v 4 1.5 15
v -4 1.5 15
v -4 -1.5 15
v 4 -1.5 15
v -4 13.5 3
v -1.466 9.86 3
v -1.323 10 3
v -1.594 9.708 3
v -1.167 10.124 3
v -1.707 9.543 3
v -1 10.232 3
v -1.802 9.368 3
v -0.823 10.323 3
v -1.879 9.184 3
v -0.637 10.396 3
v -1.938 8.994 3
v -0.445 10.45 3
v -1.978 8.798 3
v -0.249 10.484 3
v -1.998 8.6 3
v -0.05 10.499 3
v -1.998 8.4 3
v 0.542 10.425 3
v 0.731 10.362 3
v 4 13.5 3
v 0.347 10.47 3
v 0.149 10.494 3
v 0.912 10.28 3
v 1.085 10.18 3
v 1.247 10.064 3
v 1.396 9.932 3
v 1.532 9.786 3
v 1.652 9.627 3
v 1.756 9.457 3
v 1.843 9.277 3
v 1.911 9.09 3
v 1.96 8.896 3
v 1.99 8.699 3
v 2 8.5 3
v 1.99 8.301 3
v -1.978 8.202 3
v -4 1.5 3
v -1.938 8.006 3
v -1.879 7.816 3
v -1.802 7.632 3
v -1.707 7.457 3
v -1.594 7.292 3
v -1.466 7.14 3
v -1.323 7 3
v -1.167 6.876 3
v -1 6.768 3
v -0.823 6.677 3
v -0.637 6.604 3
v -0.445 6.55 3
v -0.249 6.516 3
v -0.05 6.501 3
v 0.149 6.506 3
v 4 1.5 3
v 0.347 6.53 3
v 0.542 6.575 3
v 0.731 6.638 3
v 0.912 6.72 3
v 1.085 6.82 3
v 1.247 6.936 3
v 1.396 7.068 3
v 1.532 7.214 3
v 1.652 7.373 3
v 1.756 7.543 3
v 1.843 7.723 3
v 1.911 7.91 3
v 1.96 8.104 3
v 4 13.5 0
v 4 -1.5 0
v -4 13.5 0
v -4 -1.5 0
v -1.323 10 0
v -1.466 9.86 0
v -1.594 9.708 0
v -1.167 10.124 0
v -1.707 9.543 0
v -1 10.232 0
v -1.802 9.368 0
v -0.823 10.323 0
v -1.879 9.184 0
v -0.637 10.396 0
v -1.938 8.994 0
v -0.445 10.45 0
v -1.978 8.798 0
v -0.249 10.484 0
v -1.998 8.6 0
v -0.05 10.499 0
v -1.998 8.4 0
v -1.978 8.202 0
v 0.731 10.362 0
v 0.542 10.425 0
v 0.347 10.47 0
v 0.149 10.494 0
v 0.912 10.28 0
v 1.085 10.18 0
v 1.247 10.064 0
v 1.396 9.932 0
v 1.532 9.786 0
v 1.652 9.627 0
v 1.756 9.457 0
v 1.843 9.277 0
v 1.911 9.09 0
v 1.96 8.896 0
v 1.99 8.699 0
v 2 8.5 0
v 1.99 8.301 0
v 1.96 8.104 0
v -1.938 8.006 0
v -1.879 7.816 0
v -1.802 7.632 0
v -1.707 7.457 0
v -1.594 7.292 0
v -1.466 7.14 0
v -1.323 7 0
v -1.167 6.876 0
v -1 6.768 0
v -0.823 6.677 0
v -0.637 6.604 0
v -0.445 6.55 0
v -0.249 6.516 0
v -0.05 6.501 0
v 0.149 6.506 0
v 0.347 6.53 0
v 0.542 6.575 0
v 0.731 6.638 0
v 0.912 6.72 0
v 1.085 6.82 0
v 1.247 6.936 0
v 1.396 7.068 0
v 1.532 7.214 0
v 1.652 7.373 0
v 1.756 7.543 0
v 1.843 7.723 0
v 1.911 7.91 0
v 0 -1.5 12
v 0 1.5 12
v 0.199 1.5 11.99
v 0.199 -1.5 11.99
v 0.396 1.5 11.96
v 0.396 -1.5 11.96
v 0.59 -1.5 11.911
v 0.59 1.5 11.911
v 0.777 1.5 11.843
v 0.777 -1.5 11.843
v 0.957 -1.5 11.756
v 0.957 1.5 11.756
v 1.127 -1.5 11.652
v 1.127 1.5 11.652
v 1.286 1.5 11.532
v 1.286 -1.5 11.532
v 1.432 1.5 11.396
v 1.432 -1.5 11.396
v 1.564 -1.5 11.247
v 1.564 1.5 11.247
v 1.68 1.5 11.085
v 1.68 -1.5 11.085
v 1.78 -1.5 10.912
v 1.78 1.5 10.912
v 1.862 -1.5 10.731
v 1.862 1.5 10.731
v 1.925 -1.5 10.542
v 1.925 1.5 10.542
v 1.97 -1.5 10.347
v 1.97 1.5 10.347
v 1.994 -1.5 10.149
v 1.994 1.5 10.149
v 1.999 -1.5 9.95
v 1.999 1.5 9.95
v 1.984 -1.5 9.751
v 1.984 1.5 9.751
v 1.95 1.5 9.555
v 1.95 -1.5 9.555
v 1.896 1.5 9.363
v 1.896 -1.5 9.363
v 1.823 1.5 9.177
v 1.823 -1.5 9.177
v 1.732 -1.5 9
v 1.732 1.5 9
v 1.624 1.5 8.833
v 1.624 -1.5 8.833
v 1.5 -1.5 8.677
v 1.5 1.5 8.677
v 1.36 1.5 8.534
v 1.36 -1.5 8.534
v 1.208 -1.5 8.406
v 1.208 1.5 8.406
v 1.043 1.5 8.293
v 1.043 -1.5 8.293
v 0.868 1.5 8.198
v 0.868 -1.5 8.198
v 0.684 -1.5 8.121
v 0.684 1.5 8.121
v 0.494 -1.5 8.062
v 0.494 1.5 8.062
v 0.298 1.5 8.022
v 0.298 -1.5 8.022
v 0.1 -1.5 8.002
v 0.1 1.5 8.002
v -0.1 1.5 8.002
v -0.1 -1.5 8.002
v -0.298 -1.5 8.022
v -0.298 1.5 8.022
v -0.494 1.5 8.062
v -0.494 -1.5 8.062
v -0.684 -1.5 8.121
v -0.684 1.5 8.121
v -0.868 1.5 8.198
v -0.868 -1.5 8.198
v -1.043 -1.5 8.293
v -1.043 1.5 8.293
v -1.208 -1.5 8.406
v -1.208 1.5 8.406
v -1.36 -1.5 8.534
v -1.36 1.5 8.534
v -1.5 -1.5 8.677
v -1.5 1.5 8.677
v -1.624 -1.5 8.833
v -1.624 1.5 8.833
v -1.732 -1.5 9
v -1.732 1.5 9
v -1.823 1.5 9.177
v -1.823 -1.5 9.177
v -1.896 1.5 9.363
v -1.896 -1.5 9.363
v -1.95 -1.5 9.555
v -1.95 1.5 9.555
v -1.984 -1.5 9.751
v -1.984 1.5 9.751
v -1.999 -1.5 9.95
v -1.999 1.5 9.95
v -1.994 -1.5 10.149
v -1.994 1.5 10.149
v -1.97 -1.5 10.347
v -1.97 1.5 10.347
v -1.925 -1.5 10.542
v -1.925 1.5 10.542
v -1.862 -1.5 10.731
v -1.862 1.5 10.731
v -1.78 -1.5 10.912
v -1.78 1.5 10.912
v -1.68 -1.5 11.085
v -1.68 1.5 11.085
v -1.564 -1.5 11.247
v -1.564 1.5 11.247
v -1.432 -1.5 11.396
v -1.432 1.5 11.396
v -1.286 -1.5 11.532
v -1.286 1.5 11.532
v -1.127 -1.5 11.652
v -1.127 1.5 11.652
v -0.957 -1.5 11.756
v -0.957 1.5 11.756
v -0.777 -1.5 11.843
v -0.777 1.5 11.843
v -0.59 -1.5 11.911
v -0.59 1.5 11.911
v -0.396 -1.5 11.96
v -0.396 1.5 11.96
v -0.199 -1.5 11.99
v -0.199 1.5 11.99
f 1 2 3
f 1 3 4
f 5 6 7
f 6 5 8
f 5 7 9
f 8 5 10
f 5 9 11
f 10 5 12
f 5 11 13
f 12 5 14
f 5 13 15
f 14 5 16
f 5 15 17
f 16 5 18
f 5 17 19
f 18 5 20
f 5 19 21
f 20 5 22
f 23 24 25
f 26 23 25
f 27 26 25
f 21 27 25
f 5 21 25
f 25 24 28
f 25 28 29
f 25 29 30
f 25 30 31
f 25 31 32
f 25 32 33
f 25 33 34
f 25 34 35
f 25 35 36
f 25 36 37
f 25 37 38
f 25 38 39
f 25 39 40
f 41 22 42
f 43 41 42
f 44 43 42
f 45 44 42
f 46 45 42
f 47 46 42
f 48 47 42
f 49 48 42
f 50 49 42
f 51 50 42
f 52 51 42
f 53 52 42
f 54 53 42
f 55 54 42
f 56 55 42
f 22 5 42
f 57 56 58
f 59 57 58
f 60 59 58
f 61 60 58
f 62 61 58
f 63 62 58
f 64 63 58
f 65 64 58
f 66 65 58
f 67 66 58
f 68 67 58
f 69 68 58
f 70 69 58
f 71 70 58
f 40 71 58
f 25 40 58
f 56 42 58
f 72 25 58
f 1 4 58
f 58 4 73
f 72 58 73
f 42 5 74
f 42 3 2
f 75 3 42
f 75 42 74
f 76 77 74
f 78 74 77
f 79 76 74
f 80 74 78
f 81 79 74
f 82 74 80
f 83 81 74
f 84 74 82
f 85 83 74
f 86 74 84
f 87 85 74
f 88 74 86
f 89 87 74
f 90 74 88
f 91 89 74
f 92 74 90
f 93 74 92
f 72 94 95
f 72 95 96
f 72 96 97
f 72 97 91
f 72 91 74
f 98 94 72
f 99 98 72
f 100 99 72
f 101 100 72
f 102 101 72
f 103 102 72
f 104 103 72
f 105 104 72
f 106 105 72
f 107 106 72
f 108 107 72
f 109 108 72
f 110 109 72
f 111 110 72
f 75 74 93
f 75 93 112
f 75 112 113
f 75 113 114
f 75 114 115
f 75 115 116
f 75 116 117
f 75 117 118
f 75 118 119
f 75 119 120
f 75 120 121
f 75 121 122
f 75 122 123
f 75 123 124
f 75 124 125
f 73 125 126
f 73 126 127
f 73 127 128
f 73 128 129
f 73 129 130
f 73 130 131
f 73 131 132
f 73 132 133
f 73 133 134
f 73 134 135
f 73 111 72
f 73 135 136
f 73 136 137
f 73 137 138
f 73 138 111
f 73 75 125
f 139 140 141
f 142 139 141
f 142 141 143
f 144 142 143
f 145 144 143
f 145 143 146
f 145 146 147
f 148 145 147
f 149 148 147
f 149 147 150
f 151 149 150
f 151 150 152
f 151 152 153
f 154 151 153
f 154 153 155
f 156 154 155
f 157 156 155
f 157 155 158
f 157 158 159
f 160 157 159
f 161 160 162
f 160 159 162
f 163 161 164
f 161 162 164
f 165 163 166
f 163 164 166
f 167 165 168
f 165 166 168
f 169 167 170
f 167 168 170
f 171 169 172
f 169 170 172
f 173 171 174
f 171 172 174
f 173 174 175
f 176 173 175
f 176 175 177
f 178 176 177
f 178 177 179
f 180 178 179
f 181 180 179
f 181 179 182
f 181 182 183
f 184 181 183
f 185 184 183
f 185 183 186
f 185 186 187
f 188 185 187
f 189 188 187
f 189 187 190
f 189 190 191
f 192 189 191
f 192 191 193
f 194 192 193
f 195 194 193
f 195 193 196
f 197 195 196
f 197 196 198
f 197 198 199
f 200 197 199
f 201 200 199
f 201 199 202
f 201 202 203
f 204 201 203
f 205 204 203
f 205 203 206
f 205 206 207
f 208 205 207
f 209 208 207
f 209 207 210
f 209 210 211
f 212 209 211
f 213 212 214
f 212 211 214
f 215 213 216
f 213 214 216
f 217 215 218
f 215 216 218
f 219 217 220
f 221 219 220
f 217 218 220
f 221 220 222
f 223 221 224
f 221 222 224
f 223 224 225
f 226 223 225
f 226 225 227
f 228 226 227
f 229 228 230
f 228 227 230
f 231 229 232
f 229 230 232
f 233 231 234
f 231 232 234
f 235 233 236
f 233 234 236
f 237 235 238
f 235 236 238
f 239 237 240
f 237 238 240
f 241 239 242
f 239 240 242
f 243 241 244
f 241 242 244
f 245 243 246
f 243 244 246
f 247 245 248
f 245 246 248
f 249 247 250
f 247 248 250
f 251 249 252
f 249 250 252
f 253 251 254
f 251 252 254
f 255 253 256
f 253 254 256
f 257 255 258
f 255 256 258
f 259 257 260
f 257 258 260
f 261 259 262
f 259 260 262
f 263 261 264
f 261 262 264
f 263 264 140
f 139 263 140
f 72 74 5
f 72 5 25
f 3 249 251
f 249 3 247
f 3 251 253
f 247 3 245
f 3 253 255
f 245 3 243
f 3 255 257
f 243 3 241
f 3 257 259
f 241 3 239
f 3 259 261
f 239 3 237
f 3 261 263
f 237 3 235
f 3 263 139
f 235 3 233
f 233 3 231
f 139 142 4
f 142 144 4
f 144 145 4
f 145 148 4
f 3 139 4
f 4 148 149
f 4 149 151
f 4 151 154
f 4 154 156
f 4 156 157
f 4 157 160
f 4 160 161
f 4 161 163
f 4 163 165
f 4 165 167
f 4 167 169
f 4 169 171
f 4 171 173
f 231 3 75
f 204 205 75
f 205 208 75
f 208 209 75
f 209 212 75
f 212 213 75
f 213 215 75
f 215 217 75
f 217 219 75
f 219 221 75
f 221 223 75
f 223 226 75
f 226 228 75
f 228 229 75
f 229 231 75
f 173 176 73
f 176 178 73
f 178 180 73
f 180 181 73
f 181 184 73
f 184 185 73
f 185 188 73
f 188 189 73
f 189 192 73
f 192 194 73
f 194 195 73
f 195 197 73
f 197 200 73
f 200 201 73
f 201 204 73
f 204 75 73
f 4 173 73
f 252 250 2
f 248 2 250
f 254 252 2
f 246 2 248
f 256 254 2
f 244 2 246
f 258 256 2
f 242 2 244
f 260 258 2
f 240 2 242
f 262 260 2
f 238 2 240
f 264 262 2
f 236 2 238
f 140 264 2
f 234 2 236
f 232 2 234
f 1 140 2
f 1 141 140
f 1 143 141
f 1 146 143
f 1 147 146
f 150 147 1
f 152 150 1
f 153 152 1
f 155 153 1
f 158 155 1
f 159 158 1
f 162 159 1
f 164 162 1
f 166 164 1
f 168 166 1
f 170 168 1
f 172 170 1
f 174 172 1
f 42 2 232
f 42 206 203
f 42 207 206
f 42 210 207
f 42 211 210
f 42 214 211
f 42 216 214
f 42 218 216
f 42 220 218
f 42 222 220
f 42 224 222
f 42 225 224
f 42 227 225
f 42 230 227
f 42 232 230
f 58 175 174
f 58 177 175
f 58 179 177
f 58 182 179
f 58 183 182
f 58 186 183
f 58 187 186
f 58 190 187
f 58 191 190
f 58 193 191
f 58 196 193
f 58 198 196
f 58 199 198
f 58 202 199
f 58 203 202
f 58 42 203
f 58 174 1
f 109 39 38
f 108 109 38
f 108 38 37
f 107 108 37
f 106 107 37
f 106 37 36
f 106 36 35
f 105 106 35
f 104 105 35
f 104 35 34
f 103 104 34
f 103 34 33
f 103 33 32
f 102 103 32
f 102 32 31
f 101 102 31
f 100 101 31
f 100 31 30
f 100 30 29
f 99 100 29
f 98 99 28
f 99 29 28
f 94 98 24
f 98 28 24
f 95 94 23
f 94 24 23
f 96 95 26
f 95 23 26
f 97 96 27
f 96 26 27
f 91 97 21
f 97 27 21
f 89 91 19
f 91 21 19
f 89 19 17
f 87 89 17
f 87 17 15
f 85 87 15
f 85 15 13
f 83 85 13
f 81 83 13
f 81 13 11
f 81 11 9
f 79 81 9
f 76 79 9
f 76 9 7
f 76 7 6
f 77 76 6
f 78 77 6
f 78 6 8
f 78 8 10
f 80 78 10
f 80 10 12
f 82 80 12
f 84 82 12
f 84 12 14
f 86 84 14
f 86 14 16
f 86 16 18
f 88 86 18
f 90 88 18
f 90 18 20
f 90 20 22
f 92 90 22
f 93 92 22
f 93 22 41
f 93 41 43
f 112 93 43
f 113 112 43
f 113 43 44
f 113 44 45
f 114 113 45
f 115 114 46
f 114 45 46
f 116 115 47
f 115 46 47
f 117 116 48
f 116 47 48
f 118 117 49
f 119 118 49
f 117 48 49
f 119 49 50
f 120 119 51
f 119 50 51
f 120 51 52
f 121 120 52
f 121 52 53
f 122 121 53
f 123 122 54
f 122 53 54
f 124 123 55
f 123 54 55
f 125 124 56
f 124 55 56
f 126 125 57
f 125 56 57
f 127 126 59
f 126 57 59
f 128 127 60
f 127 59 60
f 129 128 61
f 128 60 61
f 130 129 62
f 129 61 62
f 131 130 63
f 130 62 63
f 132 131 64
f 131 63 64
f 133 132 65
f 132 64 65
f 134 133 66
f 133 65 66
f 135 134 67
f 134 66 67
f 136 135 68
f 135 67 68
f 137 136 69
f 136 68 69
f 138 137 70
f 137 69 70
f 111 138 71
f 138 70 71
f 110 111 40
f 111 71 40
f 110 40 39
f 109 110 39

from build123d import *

# Parameters (mm, degrees)
ESQUISSE1_W             = 8
ESQUISSE1_H             = 3
BOSS_EXTRU_1_DEPTH      = 15
ESQUISSE2_W             = 8
ESQUISSE2_H             = 3
BOSS_EXTRU_2_DEPTH      = 12
ESQUISSE3_R             = 2
ENL_V_MAT_EXTRU_1_DEPTH = 20.62141687
ESQUISSE4_R             = 2
ENL_V_MAT_EXTRU_2_DEPTH = 19.5


with BuildPart() as part:
    # Esquisse1 → Boss.-Extru.1 (new body)
    with BuildSketch(Plane.XY):
        Rectangle(ESQUISSE1_W, ESQUISSE1_H)
    extrude(amount=BOSS_EXTRU_1_DEPTH)

    # Esquisse2 → Boss.-Extru.2 (add)
    with BuildSketch(Plane(origin=(0, 1.5, 0), x_dir=(1, 0, 0), z_dir=(0, 1, 0))):
        with Locations((0, -1.5)):
            Rectangle(ESQUISSE2_W, ESQUISSE2_H)
    extrude(amount=BOSS_EXTRU_2_DEPTH)

    # Esquisse3 → Enlèv. mat.-Extru.1 (cut, through all)
    with BuildSketch(Plane(origin=(0, 1.5, 0), x_dir=(1, 0, 0), z_dir=(0, 1, 0))):
        with Locations(Location((0, -10, 0), (0, 0, 270))):
            Circle(ESQUISSE3_R)
    extrude(amount=-ENL_V_MAT_EXTRU_1_DEPTH, mode=Mode.SUBTRACT)

    # Esquisse4 → Enlèv. mat.-Extru.2 (cut, through all)
    with BuildSketch(Plane.XY.offset(3)):
        with Locations((0, 8.5)):
            Circle(ESQUISSE4_R)
    extrude(amount=-ENL_V_MAT_EXTRU_2_DEPTH, mode=Mode.SUBTRACT)


solid = part.part
